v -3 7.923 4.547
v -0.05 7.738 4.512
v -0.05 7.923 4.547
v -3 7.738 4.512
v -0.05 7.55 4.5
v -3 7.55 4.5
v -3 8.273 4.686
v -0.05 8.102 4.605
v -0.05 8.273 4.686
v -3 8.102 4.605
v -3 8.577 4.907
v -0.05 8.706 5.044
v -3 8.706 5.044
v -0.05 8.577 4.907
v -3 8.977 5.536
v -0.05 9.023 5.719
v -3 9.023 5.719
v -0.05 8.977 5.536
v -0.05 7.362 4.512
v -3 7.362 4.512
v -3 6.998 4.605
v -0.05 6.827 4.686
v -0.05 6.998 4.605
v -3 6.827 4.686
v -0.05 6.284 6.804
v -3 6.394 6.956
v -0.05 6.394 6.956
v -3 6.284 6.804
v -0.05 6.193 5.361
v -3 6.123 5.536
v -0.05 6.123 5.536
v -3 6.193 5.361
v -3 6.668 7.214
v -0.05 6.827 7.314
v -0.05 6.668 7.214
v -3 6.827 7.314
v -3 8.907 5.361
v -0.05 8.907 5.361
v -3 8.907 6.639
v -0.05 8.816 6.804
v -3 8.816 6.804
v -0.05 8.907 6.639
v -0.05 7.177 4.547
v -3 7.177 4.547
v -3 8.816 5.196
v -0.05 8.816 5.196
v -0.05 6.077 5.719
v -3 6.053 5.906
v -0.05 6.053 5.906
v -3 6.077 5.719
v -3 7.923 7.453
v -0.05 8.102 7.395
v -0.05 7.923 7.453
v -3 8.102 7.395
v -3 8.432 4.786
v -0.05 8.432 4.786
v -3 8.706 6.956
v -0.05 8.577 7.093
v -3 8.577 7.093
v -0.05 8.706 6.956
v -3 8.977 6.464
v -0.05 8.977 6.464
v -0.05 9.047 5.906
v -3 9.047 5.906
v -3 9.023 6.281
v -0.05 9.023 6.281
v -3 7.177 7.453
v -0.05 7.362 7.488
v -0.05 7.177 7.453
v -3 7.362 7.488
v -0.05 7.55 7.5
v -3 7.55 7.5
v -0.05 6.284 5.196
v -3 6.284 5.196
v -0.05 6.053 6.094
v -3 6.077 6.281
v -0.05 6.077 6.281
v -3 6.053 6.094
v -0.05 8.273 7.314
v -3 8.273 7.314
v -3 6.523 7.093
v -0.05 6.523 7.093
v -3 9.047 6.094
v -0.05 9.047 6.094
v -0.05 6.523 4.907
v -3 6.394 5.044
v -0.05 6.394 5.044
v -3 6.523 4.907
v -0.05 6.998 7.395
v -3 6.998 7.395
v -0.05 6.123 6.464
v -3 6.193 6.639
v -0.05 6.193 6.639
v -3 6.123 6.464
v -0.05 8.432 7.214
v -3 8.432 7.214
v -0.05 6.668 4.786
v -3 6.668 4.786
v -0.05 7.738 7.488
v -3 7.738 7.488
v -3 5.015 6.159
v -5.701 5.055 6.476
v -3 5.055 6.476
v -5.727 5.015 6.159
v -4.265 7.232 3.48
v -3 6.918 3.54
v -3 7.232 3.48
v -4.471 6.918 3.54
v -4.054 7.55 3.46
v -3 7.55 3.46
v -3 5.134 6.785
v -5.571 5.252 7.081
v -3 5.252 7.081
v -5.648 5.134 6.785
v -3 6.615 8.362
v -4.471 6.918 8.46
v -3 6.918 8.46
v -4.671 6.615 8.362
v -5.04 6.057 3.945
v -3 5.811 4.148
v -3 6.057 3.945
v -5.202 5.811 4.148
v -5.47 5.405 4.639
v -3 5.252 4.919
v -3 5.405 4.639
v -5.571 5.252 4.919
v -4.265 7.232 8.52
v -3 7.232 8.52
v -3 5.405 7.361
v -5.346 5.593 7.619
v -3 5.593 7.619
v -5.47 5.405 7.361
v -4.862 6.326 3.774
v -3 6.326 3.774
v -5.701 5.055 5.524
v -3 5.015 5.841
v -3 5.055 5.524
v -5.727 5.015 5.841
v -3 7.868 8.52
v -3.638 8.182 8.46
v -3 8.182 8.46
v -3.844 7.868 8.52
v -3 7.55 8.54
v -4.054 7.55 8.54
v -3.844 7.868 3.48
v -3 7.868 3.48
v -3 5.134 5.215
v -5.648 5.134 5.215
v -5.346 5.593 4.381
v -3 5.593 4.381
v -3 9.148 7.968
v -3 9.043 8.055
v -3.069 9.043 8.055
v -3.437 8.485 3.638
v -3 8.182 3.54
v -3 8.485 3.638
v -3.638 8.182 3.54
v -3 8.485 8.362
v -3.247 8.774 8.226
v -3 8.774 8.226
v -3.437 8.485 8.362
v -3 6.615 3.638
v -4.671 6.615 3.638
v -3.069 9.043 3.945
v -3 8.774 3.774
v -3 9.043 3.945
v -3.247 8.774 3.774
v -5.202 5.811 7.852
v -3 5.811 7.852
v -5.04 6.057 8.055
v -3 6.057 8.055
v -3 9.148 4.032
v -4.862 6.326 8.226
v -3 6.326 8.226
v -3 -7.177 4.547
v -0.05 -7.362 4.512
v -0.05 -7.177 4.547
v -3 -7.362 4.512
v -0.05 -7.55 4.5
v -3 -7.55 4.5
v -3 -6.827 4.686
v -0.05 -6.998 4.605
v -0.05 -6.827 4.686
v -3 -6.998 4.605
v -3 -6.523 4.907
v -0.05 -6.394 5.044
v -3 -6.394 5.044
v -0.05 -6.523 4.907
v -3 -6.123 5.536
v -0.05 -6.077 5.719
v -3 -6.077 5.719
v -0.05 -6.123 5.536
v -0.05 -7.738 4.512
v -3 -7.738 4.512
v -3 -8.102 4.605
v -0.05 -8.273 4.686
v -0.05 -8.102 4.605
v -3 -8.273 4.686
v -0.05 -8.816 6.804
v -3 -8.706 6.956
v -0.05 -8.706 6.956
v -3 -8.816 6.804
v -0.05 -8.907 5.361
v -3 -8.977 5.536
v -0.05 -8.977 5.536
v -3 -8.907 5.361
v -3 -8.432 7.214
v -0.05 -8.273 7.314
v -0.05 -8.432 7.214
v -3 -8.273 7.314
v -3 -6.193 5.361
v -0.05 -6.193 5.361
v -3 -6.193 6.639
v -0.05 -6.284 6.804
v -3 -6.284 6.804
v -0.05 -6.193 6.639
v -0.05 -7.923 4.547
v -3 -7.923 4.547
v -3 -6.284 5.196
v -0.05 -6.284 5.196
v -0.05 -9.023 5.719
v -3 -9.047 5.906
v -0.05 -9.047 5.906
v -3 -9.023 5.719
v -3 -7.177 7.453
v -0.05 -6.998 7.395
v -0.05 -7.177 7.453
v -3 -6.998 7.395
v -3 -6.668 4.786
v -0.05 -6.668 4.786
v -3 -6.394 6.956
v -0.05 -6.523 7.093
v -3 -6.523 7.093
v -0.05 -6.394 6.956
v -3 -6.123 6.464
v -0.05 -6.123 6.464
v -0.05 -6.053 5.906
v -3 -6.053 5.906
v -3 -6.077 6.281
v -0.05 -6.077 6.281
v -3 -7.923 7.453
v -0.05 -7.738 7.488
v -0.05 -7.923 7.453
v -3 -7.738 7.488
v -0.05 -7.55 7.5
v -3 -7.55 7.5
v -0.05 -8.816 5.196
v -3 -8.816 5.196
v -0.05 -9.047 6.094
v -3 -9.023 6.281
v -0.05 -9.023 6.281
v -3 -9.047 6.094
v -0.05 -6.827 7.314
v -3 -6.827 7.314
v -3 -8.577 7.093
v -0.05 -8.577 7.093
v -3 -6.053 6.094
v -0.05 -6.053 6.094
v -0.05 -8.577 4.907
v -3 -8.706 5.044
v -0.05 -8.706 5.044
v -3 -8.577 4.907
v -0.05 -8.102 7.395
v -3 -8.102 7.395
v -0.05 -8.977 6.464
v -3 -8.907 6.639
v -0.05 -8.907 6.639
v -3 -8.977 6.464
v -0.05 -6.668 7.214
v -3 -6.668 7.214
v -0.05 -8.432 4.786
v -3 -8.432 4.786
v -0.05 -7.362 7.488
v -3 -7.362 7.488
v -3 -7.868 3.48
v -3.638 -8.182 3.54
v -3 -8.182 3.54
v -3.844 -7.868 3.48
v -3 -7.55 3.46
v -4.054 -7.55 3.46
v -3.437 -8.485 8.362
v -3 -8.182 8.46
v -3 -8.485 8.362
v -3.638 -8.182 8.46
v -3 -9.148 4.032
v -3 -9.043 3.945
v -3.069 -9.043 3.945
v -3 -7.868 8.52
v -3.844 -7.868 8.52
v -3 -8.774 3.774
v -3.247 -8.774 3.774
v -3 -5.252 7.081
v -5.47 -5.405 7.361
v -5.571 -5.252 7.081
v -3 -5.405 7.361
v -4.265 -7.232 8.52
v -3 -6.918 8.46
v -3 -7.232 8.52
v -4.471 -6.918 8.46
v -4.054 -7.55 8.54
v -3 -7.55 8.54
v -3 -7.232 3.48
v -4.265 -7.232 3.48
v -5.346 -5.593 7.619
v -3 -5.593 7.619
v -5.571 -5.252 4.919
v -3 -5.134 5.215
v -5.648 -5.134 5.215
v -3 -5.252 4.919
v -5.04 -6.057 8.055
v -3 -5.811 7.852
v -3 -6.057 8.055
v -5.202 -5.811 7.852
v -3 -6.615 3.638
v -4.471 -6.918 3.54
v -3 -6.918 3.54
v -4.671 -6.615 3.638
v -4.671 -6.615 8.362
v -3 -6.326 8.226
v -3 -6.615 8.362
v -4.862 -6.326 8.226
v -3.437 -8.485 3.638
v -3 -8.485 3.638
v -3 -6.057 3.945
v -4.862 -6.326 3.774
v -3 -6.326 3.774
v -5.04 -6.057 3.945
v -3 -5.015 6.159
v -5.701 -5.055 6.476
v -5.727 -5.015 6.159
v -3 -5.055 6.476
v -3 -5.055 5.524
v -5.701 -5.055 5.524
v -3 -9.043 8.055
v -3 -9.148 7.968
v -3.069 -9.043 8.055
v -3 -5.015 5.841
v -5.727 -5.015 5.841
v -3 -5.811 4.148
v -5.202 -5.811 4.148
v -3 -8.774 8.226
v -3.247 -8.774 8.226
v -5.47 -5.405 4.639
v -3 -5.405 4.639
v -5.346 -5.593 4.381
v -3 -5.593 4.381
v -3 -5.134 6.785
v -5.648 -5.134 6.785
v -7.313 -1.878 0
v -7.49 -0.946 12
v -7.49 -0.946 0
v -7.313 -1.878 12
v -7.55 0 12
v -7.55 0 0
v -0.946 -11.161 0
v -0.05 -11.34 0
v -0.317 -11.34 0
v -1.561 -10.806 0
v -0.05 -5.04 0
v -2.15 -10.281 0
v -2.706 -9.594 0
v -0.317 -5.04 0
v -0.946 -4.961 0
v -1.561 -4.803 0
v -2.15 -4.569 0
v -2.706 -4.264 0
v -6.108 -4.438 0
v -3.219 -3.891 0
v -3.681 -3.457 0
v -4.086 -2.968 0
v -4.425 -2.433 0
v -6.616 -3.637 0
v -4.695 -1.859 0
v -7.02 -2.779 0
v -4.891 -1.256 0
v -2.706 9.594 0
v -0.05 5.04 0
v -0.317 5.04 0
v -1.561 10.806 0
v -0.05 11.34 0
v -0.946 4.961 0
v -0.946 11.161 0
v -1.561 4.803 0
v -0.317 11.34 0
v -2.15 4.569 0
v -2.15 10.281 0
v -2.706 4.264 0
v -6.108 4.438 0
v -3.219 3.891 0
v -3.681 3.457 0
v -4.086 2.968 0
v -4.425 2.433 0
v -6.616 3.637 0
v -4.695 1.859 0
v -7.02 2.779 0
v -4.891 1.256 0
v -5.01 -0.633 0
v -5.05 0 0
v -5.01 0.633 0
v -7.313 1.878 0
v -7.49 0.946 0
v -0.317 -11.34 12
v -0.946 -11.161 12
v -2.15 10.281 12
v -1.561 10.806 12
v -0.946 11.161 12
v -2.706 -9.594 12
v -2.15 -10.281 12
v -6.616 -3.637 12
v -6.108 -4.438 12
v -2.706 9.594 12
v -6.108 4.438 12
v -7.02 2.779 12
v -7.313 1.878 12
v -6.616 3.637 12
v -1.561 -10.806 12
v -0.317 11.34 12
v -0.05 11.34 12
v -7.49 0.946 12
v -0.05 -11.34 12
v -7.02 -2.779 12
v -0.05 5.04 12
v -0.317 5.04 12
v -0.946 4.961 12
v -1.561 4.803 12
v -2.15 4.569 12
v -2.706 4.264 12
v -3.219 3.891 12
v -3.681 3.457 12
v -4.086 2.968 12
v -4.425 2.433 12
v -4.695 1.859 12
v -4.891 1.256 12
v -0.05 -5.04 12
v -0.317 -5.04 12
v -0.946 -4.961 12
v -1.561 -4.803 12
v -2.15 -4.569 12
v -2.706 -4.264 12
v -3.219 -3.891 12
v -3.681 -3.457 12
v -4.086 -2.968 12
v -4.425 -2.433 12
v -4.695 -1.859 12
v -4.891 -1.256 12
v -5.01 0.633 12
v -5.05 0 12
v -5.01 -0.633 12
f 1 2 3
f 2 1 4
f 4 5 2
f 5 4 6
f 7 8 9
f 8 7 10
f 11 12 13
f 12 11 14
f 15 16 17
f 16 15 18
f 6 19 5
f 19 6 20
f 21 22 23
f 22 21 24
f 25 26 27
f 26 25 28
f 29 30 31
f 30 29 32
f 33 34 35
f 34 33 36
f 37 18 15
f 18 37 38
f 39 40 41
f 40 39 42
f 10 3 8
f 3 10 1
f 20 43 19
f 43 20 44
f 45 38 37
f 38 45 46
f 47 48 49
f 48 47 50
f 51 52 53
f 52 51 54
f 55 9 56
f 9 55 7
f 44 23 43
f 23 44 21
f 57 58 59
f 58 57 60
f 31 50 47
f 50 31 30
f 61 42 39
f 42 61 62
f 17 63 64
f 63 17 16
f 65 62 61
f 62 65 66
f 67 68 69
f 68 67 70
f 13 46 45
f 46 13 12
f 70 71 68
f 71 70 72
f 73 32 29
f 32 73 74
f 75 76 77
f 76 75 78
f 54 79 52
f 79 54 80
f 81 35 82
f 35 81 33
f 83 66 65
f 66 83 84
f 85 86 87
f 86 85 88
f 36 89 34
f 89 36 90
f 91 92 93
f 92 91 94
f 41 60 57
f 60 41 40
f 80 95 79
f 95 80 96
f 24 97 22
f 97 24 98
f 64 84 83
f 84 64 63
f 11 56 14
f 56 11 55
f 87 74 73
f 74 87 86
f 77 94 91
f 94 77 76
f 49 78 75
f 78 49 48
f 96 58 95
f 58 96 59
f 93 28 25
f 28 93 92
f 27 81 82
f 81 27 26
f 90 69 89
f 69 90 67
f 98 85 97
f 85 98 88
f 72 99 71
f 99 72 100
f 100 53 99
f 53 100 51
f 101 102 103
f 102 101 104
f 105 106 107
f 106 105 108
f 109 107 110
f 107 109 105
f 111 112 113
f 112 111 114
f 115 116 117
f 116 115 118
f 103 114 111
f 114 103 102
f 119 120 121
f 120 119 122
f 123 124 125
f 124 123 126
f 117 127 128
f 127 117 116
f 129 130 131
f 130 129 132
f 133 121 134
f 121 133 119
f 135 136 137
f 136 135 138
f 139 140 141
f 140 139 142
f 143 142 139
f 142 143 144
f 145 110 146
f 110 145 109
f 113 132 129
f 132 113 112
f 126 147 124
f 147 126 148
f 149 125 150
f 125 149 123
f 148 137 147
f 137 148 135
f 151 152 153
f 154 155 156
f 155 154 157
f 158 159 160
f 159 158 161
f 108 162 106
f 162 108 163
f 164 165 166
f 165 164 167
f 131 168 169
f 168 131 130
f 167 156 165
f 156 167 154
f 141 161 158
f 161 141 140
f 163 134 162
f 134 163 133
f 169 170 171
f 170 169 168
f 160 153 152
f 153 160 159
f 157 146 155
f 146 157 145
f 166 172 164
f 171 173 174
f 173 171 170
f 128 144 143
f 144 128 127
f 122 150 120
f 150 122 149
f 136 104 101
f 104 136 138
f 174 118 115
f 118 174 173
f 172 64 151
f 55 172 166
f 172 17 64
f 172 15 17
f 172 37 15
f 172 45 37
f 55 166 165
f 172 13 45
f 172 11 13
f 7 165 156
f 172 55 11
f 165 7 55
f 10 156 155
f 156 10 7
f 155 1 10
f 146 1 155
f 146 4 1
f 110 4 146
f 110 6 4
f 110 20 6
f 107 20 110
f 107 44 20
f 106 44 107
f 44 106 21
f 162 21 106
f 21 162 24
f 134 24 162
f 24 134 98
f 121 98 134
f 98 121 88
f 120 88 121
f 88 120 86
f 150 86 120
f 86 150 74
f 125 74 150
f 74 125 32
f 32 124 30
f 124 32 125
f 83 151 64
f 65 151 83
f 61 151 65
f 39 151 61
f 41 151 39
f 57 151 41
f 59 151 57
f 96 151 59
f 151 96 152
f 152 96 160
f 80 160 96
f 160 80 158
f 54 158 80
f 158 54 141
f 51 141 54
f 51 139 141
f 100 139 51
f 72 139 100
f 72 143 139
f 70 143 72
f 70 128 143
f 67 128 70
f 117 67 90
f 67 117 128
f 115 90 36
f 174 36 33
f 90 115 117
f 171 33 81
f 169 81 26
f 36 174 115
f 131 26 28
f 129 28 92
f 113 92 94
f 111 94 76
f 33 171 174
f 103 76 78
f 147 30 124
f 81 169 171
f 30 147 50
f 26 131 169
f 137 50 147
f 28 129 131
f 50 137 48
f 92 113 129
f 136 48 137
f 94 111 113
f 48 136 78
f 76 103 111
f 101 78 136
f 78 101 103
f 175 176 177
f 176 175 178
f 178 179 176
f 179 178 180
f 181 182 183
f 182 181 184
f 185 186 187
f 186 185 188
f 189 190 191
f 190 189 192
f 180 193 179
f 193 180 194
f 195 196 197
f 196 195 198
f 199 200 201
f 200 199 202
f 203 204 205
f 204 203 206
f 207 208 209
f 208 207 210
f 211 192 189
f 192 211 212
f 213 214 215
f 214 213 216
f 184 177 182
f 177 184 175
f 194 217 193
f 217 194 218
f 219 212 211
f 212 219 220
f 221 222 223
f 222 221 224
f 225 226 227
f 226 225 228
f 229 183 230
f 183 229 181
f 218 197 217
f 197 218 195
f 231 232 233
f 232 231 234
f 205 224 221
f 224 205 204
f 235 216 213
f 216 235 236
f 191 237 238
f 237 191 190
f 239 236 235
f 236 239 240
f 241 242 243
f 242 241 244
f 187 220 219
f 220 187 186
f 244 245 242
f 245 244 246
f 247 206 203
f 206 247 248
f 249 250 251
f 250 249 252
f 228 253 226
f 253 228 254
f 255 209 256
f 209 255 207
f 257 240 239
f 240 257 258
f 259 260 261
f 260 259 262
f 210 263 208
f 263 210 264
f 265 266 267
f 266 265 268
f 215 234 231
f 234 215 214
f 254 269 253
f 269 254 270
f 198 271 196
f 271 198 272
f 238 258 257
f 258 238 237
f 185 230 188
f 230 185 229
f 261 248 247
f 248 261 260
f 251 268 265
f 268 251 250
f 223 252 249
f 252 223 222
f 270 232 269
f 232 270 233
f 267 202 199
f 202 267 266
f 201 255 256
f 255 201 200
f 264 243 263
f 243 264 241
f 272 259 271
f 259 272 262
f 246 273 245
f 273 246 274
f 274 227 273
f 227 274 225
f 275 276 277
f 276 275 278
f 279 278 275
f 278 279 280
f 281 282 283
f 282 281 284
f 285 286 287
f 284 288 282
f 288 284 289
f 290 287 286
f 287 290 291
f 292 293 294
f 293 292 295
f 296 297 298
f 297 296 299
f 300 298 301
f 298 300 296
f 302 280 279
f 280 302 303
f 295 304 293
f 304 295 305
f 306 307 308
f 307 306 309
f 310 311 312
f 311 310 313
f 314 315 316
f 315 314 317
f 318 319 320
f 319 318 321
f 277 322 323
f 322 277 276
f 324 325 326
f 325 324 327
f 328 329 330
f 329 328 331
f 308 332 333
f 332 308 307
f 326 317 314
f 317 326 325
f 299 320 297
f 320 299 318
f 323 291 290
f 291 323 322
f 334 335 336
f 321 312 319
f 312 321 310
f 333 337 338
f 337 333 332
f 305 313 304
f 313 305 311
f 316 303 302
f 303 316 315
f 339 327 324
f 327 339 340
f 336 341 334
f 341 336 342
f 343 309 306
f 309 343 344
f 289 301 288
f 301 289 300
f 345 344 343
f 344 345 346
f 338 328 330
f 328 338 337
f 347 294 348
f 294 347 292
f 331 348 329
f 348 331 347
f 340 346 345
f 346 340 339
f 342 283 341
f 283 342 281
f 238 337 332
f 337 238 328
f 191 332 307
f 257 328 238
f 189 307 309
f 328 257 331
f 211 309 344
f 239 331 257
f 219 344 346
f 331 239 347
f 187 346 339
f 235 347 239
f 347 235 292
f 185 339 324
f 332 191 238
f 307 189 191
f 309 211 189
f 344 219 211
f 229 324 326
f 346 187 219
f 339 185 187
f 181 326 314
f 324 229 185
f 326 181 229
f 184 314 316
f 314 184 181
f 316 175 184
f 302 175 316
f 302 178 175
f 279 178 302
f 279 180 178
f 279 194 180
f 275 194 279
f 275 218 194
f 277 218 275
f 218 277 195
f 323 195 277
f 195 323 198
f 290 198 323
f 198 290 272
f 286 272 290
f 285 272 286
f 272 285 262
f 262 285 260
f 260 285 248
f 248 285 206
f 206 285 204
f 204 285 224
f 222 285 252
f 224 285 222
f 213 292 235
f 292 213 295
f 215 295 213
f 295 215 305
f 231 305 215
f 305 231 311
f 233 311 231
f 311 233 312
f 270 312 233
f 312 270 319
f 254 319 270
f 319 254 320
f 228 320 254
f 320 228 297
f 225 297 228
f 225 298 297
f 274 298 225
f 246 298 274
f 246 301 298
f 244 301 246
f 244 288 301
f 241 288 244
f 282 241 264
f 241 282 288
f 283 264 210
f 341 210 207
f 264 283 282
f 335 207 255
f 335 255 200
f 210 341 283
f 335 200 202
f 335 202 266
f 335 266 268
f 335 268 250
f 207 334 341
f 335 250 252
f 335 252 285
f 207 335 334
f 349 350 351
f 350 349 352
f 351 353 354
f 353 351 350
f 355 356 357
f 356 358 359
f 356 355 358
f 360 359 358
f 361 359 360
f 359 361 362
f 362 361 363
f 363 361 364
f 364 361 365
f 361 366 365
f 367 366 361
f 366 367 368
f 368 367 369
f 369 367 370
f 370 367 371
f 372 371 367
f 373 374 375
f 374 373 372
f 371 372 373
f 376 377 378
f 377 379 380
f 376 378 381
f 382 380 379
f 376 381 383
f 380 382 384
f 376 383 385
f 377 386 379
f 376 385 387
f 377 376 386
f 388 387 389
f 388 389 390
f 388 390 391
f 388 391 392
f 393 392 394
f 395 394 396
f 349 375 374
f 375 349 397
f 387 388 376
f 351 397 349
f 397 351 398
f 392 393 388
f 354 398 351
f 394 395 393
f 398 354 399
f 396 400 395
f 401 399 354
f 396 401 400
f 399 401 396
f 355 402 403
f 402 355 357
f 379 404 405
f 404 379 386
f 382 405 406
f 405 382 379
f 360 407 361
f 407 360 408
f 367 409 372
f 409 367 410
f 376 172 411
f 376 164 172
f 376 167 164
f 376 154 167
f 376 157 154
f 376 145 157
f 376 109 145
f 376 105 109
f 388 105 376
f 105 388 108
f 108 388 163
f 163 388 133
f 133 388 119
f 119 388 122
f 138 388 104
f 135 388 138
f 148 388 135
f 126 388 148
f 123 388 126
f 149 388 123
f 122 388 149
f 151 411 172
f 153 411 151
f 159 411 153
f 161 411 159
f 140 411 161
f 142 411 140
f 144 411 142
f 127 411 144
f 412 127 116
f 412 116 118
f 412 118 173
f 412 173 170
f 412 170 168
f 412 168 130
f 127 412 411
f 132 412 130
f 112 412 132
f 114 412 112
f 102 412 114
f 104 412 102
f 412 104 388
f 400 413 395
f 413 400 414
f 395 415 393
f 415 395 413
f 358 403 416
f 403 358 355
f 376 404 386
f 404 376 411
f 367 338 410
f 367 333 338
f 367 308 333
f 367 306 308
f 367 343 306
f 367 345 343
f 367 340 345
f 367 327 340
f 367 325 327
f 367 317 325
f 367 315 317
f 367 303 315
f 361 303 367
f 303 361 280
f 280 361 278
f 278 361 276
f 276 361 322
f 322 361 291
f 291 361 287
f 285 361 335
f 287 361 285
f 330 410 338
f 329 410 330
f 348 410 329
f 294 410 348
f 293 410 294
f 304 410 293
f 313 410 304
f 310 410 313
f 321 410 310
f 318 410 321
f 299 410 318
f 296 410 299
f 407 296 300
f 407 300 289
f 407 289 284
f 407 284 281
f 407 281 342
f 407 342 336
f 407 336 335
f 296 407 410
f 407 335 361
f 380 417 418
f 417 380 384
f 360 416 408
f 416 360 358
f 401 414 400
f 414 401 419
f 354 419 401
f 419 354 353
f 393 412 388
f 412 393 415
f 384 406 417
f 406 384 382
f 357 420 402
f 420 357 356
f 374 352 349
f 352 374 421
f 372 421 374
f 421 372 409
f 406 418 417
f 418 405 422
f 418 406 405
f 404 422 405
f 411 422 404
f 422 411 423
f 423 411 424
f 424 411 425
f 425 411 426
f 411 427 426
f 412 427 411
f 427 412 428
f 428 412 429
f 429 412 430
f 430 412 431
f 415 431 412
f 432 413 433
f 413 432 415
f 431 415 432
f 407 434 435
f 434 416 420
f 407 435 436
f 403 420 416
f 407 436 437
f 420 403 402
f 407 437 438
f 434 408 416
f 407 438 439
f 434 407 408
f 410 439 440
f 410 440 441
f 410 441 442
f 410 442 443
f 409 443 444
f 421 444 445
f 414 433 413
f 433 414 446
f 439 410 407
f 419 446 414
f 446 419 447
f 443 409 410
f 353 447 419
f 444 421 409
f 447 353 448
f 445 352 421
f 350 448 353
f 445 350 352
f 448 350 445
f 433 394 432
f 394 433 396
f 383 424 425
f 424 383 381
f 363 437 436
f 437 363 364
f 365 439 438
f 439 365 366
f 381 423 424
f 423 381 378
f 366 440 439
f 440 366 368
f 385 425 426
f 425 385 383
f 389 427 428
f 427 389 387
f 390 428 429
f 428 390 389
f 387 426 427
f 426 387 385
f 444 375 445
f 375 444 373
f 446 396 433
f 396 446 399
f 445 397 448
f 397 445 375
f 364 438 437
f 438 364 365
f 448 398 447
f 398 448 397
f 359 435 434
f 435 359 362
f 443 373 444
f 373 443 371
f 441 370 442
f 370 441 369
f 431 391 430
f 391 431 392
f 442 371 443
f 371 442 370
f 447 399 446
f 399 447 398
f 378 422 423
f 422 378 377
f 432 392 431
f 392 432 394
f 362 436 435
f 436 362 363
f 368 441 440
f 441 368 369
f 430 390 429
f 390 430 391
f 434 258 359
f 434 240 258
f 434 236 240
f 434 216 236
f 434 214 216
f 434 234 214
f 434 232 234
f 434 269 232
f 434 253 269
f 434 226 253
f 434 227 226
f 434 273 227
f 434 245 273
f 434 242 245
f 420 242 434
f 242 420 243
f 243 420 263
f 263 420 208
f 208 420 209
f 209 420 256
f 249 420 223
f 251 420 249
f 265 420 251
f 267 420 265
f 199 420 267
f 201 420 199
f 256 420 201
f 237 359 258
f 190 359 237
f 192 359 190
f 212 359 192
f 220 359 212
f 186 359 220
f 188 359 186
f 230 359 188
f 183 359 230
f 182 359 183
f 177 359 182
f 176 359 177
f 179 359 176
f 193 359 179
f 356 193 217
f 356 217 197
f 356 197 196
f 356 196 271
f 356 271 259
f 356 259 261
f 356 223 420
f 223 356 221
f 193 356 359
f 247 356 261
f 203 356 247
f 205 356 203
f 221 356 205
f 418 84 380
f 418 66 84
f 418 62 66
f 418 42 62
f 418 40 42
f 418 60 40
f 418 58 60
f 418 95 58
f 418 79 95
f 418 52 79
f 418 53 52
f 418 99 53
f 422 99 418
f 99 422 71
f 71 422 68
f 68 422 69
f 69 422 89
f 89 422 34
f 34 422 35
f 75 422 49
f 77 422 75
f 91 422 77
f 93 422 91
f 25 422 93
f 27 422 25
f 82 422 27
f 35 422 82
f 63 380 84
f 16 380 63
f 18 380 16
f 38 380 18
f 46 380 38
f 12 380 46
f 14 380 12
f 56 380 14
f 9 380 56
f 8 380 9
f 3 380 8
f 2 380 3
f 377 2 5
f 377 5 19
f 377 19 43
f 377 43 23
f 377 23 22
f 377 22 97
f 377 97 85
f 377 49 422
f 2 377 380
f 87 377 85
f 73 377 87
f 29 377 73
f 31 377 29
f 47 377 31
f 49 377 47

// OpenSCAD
// clamped top parts

$fn=50;
inch = 25.4;

// params
length = 60;
d_stepper = 10.1;
thickness = 2.5;
d_wire = 1.3;

sp = [0, d_stepper/2+thickness, length/2-5];

module screwhole(){
    union(){
        cylinder(20, r=1.5, center=true);  // fits 4-40
        translate([0,0, 3])
        cylinder(20, r=0.2*inch/2);
        translate([0,0,-3]) rotate([180,0,0])
        cylinder(20, r=0.2*inch/2);
    }
}

module clamp_cylinder(height, scale){
    difference(){
        linear_extrude(height=height)
        hull(){
            circle(r=d_stepper/2 + thickness);
            scale([1,scale]) circle(r=d_stepper/2);
        }
        for (pm=[1,-1]){
            translate([0, (d_stepper/2+thickness)*pm, height/2])
            rotate([0,90,0])
            screwhole();
        }
    }
}

module structure_cylinder(){
    translate([0,0,-15])
    rotate([0, 0, 135])
    rotate_extrude(angle=90)
    square([d_stepper/2 + thickness, 35]);
    //cylinder(h=length, r=d_stepper/2 + thickness, center=true);
}


difference(){
    clamp_cylinder(12, 2.25);
    translate([0,0,-length/2])
    // wire through hole
    //cube([2*d_wire, 2*d_wire, length+1], center=true);
    cylinder(h=length+1, r=d_wire, center=true);
    // for (dx=[1,2,3,4]){
    //     translate([-2, d_stepper*(0.5-dx/5),0])
    //     rotate([0,180,0])
    //     cylinder(length+1, r=d_wire/2, center=true);
    // }
    translate([0,0,-15]) cylinder(51, r=d_stepper/2);
    translate([length,0,0]) cube(2*length + 0.1, center=true);
}
